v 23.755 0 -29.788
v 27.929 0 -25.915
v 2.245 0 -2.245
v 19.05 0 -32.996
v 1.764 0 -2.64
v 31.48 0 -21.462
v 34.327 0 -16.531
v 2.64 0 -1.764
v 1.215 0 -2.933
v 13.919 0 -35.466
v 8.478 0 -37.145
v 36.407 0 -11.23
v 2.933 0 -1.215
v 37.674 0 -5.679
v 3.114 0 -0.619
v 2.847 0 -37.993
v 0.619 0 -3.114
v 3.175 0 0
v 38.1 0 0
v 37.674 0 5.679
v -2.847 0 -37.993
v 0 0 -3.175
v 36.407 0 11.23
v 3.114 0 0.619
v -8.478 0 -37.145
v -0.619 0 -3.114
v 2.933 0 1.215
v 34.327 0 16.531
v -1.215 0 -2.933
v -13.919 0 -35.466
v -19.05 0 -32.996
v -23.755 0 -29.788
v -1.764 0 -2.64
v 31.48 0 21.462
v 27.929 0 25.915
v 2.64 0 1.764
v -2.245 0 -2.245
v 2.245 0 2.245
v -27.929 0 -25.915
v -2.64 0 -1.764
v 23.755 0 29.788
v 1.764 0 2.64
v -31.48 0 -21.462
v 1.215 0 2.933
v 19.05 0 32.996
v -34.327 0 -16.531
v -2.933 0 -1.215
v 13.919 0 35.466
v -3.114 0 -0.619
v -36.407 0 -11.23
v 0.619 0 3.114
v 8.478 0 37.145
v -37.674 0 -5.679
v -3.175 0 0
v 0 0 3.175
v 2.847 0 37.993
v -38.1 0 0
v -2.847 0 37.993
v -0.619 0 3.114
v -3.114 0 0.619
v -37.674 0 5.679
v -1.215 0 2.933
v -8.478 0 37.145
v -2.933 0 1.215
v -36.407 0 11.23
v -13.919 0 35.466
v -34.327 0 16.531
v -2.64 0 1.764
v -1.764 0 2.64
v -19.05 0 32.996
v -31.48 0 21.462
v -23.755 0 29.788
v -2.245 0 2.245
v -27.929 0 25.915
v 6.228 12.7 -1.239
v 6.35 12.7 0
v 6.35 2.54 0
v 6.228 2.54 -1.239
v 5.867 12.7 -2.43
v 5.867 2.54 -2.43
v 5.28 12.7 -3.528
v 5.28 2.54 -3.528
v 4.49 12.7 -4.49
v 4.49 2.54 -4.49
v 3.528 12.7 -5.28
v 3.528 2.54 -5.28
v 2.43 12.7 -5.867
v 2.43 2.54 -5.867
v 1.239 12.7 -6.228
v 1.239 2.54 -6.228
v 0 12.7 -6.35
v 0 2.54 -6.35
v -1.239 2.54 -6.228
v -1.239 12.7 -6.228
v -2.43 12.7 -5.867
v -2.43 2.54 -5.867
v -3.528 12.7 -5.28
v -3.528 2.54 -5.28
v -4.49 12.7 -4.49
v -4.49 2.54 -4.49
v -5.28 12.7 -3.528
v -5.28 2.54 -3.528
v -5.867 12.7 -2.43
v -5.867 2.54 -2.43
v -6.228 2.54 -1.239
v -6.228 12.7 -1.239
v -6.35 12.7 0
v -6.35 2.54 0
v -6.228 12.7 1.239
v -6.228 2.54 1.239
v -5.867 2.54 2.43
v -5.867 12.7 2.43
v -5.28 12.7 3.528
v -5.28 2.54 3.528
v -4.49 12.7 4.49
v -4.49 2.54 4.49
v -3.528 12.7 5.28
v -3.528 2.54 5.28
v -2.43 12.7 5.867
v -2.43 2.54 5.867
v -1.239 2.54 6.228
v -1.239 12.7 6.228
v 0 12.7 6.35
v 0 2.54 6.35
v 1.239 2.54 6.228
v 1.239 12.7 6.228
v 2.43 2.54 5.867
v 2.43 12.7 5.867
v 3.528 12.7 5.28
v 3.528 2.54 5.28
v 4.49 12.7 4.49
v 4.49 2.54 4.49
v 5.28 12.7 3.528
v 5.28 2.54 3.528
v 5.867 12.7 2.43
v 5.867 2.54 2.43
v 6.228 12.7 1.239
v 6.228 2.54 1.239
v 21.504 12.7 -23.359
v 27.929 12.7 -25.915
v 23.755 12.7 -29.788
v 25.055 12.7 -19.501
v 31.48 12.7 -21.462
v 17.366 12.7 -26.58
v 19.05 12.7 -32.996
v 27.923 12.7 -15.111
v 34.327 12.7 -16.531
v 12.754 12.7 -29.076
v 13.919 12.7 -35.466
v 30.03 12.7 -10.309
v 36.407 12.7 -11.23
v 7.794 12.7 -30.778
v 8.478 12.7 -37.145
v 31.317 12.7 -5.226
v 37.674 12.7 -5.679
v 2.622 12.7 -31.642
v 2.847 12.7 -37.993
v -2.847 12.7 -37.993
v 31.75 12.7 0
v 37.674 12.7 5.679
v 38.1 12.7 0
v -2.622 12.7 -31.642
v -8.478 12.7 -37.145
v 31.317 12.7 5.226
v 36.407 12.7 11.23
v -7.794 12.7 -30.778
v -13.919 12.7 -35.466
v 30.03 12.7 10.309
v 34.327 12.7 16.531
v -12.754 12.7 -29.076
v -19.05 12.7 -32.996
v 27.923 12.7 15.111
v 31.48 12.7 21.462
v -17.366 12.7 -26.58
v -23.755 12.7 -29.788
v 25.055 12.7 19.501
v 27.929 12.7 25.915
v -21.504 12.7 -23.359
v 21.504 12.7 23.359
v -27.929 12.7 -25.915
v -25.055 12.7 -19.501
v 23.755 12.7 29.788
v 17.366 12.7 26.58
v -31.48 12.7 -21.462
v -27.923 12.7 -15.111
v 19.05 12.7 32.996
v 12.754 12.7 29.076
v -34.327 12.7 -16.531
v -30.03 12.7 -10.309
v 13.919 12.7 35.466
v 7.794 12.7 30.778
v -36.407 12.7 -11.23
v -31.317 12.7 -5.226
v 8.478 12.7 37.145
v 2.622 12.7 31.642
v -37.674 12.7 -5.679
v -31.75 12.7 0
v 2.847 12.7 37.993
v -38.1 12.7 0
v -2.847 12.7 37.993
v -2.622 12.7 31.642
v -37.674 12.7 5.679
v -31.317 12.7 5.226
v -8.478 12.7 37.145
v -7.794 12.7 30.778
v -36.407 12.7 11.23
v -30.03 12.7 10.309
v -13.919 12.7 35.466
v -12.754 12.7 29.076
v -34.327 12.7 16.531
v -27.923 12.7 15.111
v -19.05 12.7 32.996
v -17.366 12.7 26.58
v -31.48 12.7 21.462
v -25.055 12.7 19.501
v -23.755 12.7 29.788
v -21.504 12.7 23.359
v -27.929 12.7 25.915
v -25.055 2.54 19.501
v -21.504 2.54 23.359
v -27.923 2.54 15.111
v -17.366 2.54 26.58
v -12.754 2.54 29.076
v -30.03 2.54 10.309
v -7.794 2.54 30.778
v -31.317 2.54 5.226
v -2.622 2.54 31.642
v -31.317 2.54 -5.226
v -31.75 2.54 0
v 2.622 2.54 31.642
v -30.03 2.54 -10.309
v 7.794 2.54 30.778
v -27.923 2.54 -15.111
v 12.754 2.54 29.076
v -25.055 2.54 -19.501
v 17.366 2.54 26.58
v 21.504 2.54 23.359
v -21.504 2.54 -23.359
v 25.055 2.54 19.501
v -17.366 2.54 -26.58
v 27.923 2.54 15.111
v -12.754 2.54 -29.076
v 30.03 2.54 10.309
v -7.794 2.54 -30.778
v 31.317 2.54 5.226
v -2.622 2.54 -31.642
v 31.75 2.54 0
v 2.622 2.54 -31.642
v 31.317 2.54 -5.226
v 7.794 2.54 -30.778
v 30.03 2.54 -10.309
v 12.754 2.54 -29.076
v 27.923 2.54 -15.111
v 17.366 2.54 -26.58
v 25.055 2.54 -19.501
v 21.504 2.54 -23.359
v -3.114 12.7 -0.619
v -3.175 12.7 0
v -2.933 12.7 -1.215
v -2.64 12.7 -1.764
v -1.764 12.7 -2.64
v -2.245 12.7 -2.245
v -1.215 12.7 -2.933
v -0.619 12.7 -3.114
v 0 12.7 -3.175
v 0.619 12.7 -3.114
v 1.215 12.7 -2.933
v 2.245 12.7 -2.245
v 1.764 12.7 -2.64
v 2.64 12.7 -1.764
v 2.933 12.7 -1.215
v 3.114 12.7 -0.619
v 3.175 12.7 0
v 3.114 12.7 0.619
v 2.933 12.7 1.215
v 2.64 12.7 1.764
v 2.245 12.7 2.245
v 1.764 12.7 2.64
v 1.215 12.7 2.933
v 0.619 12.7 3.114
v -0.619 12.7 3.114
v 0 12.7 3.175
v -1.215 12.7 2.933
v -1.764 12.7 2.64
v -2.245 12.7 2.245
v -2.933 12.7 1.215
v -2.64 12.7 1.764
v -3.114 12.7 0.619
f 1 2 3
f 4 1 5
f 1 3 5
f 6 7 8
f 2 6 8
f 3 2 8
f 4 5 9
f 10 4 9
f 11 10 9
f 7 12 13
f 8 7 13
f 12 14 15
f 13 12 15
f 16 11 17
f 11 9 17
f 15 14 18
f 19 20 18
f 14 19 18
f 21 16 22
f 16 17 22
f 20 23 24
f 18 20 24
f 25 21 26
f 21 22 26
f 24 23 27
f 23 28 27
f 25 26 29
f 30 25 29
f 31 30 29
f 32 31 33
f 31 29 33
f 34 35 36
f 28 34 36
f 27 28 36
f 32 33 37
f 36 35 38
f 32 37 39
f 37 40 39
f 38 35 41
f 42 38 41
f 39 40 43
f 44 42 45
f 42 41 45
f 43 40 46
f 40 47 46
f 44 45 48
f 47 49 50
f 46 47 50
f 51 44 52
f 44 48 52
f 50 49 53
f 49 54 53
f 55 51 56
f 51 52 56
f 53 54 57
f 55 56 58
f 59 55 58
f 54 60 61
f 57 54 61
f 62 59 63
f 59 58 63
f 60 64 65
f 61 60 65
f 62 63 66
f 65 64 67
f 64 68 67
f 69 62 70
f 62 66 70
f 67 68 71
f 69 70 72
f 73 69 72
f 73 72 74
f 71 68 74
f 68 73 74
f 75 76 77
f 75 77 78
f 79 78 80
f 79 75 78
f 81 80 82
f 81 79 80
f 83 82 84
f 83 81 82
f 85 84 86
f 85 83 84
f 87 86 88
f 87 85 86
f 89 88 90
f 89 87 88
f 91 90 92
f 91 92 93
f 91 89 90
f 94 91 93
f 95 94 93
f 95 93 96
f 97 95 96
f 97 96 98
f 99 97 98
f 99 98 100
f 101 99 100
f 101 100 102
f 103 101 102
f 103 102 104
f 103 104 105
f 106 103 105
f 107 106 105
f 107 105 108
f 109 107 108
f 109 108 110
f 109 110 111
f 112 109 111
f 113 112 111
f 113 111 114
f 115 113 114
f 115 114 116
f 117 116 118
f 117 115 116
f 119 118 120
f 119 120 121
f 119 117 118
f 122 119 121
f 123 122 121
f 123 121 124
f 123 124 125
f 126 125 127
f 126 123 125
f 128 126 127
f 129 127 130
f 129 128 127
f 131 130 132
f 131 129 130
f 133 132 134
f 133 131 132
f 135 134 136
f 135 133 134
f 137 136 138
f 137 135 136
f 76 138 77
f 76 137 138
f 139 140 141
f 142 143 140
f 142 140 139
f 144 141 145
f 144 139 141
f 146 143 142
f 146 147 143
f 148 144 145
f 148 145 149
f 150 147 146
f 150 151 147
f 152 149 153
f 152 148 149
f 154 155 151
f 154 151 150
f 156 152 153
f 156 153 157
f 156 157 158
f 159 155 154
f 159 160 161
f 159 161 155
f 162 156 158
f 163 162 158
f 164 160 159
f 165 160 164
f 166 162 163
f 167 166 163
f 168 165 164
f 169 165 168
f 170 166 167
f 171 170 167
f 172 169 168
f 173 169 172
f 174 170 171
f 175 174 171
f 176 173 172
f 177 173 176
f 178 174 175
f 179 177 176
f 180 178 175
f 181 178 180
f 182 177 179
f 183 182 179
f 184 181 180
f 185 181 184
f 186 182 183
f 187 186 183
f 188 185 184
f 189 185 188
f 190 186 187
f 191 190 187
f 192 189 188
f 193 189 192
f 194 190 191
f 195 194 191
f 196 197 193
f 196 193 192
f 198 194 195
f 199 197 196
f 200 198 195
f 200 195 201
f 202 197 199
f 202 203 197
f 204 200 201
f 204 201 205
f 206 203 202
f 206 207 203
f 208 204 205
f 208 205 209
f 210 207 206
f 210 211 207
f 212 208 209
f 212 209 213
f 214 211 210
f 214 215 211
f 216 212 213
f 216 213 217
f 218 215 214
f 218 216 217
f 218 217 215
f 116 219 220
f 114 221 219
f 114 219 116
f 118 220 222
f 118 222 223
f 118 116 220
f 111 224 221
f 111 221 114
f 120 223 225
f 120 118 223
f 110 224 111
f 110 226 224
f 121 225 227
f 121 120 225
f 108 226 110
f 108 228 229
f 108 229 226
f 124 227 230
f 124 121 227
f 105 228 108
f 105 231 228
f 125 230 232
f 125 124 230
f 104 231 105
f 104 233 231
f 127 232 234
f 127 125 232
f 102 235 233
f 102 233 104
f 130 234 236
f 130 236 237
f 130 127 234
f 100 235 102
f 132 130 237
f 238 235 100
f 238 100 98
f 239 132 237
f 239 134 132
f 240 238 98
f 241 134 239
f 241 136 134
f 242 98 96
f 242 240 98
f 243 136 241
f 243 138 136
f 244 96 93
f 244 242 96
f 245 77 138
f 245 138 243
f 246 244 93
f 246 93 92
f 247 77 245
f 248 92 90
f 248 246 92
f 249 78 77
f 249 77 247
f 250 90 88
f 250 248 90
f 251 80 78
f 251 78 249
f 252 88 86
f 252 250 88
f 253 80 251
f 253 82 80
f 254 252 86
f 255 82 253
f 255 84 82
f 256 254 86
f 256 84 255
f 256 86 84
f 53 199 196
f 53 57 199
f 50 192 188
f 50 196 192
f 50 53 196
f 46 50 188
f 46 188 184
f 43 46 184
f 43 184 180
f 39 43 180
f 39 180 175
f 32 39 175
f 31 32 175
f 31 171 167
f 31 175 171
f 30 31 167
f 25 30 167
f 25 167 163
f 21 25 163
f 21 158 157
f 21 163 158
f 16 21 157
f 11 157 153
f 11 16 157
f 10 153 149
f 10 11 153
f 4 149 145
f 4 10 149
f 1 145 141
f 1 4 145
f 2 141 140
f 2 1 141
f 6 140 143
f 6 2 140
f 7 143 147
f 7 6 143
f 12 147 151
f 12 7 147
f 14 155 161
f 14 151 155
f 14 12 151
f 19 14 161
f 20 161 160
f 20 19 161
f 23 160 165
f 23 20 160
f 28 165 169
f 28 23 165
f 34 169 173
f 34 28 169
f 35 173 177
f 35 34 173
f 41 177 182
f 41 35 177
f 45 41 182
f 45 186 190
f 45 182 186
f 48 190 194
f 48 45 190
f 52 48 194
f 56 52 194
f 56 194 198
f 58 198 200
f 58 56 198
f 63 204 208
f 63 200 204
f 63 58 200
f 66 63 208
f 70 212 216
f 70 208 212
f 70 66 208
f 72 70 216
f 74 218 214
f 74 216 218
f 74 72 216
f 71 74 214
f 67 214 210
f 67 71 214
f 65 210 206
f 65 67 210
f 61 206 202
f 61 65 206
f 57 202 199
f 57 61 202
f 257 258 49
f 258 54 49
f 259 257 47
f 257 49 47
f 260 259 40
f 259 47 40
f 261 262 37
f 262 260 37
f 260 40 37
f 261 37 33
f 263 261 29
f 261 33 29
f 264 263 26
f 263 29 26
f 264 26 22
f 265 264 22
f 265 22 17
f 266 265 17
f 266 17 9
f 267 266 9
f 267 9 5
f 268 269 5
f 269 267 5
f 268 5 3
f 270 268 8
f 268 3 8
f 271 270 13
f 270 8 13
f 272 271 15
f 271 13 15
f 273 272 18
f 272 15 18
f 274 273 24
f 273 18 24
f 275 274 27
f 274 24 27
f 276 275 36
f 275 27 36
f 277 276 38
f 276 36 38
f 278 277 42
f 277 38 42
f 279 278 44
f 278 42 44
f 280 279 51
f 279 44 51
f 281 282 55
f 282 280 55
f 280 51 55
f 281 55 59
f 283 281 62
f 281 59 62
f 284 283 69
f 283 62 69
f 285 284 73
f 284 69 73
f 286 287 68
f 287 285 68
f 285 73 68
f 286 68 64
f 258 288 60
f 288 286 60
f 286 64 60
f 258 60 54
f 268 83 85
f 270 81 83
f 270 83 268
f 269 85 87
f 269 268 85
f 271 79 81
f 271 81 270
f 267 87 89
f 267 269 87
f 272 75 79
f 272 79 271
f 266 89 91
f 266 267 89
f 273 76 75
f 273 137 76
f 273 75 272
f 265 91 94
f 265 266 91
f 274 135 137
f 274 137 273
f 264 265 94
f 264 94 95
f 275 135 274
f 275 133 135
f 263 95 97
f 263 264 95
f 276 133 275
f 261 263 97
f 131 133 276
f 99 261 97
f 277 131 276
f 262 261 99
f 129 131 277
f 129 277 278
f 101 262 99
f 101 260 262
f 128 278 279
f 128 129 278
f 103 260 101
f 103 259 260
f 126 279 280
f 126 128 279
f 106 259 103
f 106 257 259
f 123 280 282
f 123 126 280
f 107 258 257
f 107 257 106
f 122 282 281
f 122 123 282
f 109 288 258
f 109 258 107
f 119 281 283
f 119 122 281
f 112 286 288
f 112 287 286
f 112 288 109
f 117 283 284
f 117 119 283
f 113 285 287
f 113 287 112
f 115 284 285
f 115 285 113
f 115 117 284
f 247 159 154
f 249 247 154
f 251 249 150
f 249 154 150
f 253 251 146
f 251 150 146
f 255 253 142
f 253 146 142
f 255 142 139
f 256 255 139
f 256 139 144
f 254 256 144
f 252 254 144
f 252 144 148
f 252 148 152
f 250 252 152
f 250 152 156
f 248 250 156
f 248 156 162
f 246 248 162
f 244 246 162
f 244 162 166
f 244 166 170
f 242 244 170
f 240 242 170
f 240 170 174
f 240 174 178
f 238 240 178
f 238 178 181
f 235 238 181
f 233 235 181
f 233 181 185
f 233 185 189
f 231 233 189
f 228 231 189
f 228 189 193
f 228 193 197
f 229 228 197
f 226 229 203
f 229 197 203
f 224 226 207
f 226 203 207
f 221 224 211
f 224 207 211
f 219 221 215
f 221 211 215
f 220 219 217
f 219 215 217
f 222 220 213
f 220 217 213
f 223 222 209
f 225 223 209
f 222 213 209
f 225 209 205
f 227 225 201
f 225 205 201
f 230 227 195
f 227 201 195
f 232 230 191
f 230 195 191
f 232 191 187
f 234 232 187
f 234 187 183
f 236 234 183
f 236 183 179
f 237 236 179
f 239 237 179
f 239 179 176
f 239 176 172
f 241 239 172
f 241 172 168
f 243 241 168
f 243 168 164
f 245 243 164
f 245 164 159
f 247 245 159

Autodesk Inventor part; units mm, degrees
ref_plane "YZ Plane" through (0, 0, 0) normal (1, 0, 0) x (0, 1, 0)
ref_plane "XZ Plane" through (0, 0, 0) normal (0, 1, 0) x (-1, 0, 0)
ref_plane "XY Plane" through (0, 0, 0) normal (0, 0, 1) x (1, 0, 0)
sketch "Sketch1" plane through (0, 0, 0) normal (0, 1, 0) x (-1, 0, 0)
  circle A0 centre (0, 0) radius 38.1
  circle A1 centre (0, 0) radius 3.175
  dimension "d0" = 76.2
  dimension "d1" = 6.35
extrude "Extrusion1" add sketch "Sketch1" along normal blind 12.7
sketch "Sketch2" plane through (0, 12.7, 0) normal (0, 1, 0) x (1, 0, 0)
  circle A0 centre (0, 0) radius 6.35
  circle A1 centre (0, 0) radius 31.75
  dimension "d4" = 63.5
  dimension "d5" = 12.7
extrude "Extrusion2" cut sketch "Sketch2" against normal blind 10.16
properties part number "largeinertiawheel" material "Aluminum 6061"
